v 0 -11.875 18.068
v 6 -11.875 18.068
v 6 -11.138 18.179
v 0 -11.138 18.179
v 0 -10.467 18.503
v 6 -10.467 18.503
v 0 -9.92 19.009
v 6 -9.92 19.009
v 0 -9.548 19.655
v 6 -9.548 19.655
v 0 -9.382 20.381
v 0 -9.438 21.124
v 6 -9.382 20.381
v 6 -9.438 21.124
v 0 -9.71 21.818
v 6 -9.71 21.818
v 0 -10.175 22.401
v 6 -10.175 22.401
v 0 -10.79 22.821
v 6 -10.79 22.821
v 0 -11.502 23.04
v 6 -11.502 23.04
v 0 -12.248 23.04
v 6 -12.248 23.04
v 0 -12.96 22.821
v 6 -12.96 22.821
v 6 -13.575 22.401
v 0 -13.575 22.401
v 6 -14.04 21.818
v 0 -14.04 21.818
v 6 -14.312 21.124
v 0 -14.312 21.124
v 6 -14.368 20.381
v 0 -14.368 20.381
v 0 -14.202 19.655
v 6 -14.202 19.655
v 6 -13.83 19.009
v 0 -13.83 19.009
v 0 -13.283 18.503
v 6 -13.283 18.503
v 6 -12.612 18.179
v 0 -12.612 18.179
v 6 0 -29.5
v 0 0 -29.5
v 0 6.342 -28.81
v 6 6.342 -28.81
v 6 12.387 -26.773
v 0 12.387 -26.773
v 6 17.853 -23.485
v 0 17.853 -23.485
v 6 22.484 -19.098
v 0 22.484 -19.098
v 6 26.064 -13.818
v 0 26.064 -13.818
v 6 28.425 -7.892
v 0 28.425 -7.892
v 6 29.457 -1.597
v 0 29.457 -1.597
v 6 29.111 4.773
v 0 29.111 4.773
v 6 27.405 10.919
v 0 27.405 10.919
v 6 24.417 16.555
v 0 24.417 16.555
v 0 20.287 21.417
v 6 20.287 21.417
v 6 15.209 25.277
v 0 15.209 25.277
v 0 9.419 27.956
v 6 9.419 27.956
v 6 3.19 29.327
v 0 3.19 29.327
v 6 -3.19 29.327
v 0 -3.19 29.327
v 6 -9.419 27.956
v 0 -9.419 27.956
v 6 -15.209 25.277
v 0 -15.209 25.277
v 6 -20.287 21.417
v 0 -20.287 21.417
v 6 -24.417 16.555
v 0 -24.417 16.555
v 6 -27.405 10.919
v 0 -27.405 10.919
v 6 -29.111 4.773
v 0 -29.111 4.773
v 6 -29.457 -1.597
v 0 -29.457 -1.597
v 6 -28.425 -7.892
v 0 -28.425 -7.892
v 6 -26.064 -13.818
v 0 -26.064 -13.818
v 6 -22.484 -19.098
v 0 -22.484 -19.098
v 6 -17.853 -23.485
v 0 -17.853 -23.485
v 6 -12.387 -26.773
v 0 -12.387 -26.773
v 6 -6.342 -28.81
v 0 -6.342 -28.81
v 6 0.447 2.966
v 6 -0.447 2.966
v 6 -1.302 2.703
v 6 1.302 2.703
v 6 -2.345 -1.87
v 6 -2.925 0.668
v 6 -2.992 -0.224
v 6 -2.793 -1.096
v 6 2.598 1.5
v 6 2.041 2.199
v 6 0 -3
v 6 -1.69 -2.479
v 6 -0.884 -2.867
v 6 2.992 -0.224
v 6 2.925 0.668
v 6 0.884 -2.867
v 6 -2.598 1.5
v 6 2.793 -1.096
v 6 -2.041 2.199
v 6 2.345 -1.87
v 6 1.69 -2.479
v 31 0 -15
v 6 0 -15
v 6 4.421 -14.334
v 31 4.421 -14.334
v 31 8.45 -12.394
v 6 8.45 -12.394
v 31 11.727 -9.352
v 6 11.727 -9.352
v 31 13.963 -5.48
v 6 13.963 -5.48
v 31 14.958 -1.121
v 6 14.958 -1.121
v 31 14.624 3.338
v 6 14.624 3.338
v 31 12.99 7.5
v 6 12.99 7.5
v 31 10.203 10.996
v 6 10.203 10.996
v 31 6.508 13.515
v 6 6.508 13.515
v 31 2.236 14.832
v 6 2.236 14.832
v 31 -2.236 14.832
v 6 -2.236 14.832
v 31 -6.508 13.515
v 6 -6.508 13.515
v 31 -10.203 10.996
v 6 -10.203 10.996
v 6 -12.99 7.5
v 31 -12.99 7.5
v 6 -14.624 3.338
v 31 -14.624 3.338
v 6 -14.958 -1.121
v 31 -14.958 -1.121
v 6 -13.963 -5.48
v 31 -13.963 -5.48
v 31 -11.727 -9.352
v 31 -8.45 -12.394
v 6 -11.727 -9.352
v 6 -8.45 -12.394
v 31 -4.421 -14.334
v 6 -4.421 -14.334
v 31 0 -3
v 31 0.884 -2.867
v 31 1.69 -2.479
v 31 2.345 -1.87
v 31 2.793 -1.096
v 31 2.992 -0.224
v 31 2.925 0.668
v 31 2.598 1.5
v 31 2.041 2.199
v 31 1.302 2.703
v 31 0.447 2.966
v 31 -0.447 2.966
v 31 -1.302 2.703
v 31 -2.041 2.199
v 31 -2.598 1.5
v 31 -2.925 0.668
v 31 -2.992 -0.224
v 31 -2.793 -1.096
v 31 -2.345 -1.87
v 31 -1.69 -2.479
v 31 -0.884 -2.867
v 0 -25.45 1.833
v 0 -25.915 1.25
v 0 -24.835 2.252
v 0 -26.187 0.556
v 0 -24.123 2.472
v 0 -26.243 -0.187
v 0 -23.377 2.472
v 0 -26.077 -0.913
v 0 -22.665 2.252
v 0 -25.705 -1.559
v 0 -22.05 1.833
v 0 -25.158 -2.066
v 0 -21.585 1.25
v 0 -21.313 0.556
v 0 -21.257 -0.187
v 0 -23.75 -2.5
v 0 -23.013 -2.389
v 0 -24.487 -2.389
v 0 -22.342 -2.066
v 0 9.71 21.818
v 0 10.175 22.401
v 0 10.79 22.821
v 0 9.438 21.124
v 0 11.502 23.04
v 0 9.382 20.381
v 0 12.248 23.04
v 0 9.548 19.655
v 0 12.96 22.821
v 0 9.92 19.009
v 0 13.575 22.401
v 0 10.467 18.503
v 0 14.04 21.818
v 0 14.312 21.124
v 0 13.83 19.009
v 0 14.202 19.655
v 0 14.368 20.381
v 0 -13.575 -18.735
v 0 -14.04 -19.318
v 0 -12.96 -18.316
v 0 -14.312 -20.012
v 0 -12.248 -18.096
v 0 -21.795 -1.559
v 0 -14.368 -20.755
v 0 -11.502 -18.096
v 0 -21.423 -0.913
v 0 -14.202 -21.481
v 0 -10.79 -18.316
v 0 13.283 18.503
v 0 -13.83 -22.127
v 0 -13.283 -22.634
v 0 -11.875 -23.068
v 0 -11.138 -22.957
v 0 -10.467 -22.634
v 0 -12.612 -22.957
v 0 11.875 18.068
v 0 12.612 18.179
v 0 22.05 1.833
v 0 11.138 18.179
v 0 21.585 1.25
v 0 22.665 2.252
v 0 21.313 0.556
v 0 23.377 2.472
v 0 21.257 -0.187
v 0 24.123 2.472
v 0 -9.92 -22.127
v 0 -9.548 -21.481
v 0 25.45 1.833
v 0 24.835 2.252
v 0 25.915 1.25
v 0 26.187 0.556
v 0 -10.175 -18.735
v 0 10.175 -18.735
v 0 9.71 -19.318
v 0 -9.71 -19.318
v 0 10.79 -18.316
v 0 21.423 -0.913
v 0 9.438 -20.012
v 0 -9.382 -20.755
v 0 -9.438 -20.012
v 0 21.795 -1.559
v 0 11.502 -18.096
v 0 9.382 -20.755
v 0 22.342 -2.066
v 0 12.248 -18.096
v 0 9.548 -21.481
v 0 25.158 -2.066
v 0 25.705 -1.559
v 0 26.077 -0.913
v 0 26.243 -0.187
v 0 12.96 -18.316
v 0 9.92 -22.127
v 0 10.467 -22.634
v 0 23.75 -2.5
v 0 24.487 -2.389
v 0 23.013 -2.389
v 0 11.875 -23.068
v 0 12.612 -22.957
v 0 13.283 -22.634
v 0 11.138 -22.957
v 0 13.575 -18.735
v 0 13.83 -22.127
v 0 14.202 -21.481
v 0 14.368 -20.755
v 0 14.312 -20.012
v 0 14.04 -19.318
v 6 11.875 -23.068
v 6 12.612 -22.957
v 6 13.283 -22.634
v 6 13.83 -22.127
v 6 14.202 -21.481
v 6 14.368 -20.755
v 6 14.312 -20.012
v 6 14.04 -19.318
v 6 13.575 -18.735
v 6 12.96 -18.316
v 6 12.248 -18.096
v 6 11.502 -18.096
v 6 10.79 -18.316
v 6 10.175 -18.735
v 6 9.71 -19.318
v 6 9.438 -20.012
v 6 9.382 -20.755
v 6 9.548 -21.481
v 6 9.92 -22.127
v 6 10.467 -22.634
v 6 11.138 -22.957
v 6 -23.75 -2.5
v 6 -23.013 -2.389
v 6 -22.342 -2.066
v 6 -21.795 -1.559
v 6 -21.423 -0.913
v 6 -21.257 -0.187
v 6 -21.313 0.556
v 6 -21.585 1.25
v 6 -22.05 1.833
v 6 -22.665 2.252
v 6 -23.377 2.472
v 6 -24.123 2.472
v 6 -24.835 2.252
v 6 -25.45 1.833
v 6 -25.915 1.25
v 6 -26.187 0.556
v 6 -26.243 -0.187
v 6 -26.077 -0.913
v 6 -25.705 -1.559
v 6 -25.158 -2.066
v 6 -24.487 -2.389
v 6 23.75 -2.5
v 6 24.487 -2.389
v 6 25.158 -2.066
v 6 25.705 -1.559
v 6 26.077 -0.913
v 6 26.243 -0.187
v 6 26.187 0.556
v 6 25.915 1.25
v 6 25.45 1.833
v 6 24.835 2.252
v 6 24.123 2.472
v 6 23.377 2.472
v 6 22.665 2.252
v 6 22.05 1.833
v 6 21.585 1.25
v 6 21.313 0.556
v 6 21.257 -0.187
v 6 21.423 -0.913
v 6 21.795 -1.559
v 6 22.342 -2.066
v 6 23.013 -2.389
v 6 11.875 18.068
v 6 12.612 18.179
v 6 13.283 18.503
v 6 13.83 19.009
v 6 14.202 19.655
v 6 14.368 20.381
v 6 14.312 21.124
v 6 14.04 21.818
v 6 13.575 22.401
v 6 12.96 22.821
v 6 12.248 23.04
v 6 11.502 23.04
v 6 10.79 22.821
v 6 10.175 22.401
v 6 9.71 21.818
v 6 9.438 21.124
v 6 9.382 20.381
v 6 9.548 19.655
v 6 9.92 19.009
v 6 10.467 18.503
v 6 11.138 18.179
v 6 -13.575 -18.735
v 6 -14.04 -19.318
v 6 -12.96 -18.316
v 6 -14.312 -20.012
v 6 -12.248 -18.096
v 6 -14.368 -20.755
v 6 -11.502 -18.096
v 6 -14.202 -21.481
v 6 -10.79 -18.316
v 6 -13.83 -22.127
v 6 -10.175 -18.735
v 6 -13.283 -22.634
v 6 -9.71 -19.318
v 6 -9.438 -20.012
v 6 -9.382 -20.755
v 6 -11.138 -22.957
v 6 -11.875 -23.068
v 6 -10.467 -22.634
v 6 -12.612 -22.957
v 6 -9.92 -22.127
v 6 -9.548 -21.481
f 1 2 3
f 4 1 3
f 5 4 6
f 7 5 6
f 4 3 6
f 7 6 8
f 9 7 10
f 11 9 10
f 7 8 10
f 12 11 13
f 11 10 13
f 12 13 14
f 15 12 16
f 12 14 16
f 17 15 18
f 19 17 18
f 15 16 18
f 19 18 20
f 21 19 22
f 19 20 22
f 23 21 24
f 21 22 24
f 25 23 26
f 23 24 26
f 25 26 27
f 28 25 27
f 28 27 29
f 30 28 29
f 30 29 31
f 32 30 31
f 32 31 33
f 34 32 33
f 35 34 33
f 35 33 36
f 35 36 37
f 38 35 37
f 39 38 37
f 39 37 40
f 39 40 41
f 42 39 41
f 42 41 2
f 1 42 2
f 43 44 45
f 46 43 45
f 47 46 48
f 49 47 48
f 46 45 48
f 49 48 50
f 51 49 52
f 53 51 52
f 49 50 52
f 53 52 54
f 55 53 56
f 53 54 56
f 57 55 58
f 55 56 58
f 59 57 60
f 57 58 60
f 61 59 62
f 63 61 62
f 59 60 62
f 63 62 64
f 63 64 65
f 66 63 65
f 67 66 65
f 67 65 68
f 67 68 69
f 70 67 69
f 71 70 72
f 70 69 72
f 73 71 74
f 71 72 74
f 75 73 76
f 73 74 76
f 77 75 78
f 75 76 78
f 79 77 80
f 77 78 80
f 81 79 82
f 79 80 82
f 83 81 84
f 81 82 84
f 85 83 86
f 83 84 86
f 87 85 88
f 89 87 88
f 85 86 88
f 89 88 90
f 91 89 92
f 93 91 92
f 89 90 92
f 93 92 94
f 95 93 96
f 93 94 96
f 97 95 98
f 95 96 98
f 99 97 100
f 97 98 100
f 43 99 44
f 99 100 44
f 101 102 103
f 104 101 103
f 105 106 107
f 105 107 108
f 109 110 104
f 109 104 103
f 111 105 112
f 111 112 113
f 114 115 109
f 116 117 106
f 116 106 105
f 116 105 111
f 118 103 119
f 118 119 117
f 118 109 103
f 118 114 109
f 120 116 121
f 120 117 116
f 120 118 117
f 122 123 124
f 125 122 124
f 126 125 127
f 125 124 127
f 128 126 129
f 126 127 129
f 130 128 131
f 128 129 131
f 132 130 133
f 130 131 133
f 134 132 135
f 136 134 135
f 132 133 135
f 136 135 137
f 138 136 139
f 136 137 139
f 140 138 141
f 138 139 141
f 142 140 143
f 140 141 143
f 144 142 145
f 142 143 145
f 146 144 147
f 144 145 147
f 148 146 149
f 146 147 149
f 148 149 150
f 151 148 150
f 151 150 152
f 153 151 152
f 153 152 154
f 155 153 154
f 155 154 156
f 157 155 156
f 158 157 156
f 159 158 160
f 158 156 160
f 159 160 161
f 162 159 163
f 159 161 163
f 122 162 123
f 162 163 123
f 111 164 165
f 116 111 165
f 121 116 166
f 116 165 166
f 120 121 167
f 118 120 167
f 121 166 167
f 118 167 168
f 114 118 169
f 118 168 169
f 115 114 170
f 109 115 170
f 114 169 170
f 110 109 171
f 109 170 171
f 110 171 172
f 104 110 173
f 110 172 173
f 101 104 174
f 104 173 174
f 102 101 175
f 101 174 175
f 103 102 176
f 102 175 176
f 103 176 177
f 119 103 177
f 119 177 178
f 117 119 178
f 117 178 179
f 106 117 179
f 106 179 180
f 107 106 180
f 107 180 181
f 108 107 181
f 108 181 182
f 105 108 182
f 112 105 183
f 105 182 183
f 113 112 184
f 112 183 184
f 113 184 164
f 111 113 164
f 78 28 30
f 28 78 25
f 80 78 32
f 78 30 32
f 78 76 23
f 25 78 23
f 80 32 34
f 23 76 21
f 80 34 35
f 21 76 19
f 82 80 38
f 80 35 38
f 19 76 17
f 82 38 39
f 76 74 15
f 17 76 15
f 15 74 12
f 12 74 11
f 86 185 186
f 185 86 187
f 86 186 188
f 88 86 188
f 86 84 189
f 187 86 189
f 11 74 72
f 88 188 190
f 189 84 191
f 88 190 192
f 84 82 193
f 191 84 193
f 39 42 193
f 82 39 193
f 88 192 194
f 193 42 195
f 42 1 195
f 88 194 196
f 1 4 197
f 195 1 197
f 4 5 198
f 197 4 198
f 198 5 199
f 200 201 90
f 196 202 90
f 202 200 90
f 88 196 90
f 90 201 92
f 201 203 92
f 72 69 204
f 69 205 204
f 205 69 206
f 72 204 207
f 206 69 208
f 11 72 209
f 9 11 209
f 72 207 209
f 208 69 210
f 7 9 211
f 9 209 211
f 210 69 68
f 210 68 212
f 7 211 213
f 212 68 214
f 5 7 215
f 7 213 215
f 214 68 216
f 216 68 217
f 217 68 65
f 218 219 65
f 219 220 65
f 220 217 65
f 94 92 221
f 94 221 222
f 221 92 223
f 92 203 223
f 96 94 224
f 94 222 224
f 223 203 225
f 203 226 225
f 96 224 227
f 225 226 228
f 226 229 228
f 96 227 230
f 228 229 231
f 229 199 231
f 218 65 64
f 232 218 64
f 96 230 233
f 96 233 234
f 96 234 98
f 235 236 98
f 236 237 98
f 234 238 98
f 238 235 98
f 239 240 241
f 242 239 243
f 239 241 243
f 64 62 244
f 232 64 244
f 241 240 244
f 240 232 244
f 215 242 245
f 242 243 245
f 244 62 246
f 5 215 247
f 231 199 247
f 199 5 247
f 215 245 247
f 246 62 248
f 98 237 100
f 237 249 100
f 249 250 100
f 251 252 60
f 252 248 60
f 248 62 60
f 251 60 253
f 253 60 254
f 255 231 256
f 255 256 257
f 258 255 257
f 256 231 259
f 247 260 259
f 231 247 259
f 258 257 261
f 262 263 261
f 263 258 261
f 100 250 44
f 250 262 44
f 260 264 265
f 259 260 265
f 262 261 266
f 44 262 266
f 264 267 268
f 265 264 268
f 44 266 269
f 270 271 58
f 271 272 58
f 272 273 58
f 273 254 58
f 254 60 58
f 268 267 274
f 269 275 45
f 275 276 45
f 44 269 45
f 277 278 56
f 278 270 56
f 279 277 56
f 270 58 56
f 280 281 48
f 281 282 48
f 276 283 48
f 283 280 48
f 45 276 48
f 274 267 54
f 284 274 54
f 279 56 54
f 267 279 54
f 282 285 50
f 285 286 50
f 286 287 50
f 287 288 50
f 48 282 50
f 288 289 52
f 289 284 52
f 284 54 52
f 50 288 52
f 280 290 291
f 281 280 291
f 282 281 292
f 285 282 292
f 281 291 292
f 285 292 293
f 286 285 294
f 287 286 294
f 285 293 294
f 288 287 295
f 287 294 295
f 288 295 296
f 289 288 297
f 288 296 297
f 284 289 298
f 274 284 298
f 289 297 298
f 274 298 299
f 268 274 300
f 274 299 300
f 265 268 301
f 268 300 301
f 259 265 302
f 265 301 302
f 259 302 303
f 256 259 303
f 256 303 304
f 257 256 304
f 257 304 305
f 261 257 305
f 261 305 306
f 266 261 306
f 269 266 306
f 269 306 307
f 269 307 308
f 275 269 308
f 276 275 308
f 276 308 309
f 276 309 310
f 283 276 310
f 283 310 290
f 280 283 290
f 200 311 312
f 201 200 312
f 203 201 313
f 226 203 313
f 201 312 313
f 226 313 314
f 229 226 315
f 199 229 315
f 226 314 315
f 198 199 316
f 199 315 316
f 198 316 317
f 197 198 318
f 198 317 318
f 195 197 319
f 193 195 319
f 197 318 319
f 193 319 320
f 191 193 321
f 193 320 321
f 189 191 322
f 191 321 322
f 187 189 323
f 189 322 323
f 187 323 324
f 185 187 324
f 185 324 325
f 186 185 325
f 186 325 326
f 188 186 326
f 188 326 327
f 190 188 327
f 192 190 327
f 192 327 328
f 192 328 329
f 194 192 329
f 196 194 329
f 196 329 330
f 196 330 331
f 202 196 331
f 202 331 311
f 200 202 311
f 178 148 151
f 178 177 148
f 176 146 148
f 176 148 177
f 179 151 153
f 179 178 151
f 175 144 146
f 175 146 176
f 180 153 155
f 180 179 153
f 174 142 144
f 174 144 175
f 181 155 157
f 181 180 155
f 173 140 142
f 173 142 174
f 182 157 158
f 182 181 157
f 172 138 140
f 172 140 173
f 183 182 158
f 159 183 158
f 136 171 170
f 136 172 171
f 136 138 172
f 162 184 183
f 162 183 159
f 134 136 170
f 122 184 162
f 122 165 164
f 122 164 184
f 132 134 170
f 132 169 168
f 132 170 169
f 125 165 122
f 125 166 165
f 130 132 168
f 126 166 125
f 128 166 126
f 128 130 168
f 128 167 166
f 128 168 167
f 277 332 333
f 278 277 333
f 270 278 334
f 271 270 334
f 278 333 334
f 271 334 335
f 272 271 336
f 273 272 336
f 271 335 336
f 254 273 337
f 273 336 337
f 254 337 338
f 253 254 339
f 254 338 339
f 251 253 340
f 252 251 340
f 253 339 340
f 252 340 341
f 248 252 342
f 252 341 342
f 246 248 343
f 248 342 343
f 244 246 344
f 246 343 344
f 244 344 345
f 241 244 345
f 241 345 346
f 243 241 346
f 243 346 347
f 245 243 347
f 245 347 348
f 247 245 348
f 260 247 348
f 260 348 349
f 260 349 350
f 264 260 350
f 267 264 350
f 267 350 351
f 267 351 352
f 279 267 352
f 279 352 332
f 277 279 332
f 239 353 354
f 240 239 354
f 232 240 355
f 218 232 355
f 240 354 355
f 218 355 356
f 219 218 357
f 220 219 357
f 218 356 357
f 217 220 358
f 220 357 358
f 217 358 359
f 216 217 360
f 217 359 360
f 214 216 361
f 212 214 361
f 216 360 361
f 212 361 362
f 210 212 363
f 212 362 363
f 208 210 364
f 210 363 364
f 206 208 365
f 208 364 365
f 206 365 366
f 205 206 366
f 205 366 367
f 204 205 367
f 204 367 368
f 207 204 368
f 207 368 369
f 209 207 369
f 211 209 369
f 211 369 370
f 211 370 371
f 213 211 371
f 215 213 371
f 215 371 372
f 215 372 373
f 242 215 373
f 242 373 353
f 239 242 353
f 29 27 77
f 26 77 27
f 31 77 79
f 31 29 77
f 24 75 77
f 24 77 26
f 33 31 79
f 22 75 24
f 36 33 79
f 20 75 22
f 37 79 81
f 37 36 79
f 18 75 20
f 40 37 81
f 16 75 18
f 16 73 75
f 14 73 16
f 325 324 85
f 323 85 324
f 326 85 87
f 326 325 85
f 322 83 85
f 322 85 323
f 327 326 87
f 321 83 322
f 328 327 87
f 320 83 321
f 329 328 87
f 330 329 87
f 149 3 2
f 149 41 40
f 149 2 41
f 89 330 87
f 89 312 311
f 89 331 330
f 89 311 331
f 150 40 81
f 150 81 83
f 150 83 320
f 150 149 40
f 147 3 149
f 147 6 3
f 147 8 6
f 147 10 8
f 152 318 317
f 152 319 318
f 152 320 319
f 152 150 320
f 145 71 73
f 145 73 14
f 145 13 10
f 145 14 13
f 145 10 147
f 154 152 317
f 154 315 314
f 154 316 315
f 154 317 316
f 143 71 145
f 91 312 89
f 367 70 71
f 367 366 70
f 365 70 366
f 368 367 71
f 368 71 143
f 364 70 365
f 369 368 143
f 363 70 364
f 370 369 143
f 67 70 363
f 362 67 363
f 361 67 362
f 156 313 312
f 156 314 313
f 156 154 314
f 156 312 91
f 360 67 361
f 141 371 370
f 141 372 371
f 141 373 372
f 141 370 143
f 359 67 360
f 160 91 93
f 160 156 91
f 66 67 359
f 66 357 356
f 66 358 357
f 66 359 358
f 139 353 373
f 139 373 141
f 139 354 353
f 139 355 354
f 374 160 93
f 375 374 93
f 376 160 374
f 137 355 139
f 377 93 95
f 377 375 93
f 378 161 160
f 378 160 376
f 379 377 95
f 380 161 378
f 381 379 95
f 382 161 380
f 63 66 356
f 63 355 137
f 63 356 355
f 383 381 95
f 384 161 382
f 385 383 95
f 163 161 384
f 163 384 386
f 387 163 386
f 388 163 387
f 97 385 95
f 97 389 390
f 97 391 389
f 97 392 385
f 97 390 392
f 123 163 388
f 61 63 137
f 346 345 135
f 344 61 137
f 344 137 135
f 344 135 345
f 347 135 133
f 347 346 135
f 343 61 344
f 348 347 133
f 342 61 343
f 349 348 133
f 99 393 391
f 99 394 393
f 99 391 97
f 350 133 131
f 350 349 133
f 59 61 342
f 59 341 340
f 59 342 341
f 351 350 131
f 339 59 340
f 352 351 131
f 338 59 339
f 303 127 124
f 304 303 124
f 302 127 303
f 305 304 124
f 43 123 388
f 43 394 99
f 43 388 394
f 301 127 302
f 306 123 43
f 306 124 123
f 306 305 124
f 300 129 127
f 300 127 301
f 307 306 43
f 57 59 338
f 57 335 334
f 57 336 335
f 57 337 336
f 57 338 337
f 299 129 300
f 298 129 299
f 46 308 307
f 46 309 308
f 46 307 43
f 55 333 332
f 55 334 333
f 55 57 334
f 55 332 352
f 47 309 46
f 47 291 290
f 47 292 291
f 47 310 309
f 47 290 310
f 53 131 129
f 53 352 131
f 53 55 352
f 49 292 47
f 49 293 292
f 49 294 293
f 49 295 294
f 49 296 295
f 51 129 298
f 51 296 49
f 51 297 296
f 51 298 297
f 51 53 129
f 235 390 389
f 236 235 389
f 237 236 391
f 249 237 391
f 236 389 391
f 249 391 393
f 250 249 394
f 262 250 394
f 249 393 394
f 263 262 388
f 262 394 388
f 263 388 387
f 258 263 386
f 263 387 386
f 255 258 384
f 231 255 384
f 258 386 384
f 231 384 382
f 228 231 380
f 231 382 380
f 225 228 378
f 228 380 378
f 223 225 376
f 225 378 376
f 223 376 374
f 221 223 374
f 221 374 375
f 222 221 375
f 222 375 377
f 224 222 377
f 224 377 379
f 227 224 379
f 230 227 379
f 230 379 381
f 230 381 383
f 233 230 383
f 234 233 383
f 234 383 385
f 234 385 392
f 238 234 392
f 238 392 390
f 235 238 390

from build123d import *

# Parameters (mm, degrees)
SKETCH1_R           = 29.5
BOSS_EXTRUDE1_DEPTH = 6
SKETCH2_R           = 15
BOSS_EXTRUDE2_DEPTH = 25
SKETCH3_R           = 3
CUT_EXTRUDE1_DEPTH  = 25
SKETCH4_R           = 2.5
CUT_EXTRUDE2_DEPTH  = 25


with BuildPart() as part:
    # Sketch1 → Boss-Extrude1 (new body)
    with BuildSketch(Plane(origin=(0, 0, 0), x_dir=(0, 0, -1), z_dir=(1, 0, 0))):
        Circle(SKETCH1_R)
    extrude(amount=BOSS_EXTRUDE1_DEPTH)

    # Sketch2 → Boss-Extrude2 (add)
    with BuildSketch(Plane(origin=(6, 0, 0), x_dir=(0, 0, -1), z_dir=(1, 0, 0))):
        Circle(SKETCH2_R)
    extrude(amount=BOSS_EXTRUDE2_DEPTH)

    # Sketch3 → Cut-Extrude1 (cut)
    with BuildSketch(Plane(origin=(31, 0, 0), x_dir=(0, 0, -1), z_dir=(1, 0, 0))):
        Circle(SKETCH3_R)
    extrude(amount=-CUT_EXTRUDE1_DEPTH, mode=Mode.SUBTRACT)

    # Sketch4 → Cut-Extrude2 (cut)
    with BuildSketch(Plane(origin=(6, 0, 0), x_dir=(0, 0, -1), z_dir=(1, 0, 0))):
        with Locations((0, 23.75)):
            Circle(SKETCH4_R)
        with Locations((20.56810334, 11.875)):
            Circle(SKETCH4_R)
        with Locations((20.56810334, -11.875)):
            Circle(SKETCH4_R)
        with Locations((0, -23.75)):
            Circle(SKETCH4_R)
        with Locations((-20.56810334, -11.875)):
            Circle(SKETCH4_R)
        with Locations((-20.56810334, 11.875)):
            Circle(SKETCH4_R)
    extrude(amount=-CUT_EXTRUDE2_DEPTH, mode=Mode.SUBTRACT)


solid = part.part
